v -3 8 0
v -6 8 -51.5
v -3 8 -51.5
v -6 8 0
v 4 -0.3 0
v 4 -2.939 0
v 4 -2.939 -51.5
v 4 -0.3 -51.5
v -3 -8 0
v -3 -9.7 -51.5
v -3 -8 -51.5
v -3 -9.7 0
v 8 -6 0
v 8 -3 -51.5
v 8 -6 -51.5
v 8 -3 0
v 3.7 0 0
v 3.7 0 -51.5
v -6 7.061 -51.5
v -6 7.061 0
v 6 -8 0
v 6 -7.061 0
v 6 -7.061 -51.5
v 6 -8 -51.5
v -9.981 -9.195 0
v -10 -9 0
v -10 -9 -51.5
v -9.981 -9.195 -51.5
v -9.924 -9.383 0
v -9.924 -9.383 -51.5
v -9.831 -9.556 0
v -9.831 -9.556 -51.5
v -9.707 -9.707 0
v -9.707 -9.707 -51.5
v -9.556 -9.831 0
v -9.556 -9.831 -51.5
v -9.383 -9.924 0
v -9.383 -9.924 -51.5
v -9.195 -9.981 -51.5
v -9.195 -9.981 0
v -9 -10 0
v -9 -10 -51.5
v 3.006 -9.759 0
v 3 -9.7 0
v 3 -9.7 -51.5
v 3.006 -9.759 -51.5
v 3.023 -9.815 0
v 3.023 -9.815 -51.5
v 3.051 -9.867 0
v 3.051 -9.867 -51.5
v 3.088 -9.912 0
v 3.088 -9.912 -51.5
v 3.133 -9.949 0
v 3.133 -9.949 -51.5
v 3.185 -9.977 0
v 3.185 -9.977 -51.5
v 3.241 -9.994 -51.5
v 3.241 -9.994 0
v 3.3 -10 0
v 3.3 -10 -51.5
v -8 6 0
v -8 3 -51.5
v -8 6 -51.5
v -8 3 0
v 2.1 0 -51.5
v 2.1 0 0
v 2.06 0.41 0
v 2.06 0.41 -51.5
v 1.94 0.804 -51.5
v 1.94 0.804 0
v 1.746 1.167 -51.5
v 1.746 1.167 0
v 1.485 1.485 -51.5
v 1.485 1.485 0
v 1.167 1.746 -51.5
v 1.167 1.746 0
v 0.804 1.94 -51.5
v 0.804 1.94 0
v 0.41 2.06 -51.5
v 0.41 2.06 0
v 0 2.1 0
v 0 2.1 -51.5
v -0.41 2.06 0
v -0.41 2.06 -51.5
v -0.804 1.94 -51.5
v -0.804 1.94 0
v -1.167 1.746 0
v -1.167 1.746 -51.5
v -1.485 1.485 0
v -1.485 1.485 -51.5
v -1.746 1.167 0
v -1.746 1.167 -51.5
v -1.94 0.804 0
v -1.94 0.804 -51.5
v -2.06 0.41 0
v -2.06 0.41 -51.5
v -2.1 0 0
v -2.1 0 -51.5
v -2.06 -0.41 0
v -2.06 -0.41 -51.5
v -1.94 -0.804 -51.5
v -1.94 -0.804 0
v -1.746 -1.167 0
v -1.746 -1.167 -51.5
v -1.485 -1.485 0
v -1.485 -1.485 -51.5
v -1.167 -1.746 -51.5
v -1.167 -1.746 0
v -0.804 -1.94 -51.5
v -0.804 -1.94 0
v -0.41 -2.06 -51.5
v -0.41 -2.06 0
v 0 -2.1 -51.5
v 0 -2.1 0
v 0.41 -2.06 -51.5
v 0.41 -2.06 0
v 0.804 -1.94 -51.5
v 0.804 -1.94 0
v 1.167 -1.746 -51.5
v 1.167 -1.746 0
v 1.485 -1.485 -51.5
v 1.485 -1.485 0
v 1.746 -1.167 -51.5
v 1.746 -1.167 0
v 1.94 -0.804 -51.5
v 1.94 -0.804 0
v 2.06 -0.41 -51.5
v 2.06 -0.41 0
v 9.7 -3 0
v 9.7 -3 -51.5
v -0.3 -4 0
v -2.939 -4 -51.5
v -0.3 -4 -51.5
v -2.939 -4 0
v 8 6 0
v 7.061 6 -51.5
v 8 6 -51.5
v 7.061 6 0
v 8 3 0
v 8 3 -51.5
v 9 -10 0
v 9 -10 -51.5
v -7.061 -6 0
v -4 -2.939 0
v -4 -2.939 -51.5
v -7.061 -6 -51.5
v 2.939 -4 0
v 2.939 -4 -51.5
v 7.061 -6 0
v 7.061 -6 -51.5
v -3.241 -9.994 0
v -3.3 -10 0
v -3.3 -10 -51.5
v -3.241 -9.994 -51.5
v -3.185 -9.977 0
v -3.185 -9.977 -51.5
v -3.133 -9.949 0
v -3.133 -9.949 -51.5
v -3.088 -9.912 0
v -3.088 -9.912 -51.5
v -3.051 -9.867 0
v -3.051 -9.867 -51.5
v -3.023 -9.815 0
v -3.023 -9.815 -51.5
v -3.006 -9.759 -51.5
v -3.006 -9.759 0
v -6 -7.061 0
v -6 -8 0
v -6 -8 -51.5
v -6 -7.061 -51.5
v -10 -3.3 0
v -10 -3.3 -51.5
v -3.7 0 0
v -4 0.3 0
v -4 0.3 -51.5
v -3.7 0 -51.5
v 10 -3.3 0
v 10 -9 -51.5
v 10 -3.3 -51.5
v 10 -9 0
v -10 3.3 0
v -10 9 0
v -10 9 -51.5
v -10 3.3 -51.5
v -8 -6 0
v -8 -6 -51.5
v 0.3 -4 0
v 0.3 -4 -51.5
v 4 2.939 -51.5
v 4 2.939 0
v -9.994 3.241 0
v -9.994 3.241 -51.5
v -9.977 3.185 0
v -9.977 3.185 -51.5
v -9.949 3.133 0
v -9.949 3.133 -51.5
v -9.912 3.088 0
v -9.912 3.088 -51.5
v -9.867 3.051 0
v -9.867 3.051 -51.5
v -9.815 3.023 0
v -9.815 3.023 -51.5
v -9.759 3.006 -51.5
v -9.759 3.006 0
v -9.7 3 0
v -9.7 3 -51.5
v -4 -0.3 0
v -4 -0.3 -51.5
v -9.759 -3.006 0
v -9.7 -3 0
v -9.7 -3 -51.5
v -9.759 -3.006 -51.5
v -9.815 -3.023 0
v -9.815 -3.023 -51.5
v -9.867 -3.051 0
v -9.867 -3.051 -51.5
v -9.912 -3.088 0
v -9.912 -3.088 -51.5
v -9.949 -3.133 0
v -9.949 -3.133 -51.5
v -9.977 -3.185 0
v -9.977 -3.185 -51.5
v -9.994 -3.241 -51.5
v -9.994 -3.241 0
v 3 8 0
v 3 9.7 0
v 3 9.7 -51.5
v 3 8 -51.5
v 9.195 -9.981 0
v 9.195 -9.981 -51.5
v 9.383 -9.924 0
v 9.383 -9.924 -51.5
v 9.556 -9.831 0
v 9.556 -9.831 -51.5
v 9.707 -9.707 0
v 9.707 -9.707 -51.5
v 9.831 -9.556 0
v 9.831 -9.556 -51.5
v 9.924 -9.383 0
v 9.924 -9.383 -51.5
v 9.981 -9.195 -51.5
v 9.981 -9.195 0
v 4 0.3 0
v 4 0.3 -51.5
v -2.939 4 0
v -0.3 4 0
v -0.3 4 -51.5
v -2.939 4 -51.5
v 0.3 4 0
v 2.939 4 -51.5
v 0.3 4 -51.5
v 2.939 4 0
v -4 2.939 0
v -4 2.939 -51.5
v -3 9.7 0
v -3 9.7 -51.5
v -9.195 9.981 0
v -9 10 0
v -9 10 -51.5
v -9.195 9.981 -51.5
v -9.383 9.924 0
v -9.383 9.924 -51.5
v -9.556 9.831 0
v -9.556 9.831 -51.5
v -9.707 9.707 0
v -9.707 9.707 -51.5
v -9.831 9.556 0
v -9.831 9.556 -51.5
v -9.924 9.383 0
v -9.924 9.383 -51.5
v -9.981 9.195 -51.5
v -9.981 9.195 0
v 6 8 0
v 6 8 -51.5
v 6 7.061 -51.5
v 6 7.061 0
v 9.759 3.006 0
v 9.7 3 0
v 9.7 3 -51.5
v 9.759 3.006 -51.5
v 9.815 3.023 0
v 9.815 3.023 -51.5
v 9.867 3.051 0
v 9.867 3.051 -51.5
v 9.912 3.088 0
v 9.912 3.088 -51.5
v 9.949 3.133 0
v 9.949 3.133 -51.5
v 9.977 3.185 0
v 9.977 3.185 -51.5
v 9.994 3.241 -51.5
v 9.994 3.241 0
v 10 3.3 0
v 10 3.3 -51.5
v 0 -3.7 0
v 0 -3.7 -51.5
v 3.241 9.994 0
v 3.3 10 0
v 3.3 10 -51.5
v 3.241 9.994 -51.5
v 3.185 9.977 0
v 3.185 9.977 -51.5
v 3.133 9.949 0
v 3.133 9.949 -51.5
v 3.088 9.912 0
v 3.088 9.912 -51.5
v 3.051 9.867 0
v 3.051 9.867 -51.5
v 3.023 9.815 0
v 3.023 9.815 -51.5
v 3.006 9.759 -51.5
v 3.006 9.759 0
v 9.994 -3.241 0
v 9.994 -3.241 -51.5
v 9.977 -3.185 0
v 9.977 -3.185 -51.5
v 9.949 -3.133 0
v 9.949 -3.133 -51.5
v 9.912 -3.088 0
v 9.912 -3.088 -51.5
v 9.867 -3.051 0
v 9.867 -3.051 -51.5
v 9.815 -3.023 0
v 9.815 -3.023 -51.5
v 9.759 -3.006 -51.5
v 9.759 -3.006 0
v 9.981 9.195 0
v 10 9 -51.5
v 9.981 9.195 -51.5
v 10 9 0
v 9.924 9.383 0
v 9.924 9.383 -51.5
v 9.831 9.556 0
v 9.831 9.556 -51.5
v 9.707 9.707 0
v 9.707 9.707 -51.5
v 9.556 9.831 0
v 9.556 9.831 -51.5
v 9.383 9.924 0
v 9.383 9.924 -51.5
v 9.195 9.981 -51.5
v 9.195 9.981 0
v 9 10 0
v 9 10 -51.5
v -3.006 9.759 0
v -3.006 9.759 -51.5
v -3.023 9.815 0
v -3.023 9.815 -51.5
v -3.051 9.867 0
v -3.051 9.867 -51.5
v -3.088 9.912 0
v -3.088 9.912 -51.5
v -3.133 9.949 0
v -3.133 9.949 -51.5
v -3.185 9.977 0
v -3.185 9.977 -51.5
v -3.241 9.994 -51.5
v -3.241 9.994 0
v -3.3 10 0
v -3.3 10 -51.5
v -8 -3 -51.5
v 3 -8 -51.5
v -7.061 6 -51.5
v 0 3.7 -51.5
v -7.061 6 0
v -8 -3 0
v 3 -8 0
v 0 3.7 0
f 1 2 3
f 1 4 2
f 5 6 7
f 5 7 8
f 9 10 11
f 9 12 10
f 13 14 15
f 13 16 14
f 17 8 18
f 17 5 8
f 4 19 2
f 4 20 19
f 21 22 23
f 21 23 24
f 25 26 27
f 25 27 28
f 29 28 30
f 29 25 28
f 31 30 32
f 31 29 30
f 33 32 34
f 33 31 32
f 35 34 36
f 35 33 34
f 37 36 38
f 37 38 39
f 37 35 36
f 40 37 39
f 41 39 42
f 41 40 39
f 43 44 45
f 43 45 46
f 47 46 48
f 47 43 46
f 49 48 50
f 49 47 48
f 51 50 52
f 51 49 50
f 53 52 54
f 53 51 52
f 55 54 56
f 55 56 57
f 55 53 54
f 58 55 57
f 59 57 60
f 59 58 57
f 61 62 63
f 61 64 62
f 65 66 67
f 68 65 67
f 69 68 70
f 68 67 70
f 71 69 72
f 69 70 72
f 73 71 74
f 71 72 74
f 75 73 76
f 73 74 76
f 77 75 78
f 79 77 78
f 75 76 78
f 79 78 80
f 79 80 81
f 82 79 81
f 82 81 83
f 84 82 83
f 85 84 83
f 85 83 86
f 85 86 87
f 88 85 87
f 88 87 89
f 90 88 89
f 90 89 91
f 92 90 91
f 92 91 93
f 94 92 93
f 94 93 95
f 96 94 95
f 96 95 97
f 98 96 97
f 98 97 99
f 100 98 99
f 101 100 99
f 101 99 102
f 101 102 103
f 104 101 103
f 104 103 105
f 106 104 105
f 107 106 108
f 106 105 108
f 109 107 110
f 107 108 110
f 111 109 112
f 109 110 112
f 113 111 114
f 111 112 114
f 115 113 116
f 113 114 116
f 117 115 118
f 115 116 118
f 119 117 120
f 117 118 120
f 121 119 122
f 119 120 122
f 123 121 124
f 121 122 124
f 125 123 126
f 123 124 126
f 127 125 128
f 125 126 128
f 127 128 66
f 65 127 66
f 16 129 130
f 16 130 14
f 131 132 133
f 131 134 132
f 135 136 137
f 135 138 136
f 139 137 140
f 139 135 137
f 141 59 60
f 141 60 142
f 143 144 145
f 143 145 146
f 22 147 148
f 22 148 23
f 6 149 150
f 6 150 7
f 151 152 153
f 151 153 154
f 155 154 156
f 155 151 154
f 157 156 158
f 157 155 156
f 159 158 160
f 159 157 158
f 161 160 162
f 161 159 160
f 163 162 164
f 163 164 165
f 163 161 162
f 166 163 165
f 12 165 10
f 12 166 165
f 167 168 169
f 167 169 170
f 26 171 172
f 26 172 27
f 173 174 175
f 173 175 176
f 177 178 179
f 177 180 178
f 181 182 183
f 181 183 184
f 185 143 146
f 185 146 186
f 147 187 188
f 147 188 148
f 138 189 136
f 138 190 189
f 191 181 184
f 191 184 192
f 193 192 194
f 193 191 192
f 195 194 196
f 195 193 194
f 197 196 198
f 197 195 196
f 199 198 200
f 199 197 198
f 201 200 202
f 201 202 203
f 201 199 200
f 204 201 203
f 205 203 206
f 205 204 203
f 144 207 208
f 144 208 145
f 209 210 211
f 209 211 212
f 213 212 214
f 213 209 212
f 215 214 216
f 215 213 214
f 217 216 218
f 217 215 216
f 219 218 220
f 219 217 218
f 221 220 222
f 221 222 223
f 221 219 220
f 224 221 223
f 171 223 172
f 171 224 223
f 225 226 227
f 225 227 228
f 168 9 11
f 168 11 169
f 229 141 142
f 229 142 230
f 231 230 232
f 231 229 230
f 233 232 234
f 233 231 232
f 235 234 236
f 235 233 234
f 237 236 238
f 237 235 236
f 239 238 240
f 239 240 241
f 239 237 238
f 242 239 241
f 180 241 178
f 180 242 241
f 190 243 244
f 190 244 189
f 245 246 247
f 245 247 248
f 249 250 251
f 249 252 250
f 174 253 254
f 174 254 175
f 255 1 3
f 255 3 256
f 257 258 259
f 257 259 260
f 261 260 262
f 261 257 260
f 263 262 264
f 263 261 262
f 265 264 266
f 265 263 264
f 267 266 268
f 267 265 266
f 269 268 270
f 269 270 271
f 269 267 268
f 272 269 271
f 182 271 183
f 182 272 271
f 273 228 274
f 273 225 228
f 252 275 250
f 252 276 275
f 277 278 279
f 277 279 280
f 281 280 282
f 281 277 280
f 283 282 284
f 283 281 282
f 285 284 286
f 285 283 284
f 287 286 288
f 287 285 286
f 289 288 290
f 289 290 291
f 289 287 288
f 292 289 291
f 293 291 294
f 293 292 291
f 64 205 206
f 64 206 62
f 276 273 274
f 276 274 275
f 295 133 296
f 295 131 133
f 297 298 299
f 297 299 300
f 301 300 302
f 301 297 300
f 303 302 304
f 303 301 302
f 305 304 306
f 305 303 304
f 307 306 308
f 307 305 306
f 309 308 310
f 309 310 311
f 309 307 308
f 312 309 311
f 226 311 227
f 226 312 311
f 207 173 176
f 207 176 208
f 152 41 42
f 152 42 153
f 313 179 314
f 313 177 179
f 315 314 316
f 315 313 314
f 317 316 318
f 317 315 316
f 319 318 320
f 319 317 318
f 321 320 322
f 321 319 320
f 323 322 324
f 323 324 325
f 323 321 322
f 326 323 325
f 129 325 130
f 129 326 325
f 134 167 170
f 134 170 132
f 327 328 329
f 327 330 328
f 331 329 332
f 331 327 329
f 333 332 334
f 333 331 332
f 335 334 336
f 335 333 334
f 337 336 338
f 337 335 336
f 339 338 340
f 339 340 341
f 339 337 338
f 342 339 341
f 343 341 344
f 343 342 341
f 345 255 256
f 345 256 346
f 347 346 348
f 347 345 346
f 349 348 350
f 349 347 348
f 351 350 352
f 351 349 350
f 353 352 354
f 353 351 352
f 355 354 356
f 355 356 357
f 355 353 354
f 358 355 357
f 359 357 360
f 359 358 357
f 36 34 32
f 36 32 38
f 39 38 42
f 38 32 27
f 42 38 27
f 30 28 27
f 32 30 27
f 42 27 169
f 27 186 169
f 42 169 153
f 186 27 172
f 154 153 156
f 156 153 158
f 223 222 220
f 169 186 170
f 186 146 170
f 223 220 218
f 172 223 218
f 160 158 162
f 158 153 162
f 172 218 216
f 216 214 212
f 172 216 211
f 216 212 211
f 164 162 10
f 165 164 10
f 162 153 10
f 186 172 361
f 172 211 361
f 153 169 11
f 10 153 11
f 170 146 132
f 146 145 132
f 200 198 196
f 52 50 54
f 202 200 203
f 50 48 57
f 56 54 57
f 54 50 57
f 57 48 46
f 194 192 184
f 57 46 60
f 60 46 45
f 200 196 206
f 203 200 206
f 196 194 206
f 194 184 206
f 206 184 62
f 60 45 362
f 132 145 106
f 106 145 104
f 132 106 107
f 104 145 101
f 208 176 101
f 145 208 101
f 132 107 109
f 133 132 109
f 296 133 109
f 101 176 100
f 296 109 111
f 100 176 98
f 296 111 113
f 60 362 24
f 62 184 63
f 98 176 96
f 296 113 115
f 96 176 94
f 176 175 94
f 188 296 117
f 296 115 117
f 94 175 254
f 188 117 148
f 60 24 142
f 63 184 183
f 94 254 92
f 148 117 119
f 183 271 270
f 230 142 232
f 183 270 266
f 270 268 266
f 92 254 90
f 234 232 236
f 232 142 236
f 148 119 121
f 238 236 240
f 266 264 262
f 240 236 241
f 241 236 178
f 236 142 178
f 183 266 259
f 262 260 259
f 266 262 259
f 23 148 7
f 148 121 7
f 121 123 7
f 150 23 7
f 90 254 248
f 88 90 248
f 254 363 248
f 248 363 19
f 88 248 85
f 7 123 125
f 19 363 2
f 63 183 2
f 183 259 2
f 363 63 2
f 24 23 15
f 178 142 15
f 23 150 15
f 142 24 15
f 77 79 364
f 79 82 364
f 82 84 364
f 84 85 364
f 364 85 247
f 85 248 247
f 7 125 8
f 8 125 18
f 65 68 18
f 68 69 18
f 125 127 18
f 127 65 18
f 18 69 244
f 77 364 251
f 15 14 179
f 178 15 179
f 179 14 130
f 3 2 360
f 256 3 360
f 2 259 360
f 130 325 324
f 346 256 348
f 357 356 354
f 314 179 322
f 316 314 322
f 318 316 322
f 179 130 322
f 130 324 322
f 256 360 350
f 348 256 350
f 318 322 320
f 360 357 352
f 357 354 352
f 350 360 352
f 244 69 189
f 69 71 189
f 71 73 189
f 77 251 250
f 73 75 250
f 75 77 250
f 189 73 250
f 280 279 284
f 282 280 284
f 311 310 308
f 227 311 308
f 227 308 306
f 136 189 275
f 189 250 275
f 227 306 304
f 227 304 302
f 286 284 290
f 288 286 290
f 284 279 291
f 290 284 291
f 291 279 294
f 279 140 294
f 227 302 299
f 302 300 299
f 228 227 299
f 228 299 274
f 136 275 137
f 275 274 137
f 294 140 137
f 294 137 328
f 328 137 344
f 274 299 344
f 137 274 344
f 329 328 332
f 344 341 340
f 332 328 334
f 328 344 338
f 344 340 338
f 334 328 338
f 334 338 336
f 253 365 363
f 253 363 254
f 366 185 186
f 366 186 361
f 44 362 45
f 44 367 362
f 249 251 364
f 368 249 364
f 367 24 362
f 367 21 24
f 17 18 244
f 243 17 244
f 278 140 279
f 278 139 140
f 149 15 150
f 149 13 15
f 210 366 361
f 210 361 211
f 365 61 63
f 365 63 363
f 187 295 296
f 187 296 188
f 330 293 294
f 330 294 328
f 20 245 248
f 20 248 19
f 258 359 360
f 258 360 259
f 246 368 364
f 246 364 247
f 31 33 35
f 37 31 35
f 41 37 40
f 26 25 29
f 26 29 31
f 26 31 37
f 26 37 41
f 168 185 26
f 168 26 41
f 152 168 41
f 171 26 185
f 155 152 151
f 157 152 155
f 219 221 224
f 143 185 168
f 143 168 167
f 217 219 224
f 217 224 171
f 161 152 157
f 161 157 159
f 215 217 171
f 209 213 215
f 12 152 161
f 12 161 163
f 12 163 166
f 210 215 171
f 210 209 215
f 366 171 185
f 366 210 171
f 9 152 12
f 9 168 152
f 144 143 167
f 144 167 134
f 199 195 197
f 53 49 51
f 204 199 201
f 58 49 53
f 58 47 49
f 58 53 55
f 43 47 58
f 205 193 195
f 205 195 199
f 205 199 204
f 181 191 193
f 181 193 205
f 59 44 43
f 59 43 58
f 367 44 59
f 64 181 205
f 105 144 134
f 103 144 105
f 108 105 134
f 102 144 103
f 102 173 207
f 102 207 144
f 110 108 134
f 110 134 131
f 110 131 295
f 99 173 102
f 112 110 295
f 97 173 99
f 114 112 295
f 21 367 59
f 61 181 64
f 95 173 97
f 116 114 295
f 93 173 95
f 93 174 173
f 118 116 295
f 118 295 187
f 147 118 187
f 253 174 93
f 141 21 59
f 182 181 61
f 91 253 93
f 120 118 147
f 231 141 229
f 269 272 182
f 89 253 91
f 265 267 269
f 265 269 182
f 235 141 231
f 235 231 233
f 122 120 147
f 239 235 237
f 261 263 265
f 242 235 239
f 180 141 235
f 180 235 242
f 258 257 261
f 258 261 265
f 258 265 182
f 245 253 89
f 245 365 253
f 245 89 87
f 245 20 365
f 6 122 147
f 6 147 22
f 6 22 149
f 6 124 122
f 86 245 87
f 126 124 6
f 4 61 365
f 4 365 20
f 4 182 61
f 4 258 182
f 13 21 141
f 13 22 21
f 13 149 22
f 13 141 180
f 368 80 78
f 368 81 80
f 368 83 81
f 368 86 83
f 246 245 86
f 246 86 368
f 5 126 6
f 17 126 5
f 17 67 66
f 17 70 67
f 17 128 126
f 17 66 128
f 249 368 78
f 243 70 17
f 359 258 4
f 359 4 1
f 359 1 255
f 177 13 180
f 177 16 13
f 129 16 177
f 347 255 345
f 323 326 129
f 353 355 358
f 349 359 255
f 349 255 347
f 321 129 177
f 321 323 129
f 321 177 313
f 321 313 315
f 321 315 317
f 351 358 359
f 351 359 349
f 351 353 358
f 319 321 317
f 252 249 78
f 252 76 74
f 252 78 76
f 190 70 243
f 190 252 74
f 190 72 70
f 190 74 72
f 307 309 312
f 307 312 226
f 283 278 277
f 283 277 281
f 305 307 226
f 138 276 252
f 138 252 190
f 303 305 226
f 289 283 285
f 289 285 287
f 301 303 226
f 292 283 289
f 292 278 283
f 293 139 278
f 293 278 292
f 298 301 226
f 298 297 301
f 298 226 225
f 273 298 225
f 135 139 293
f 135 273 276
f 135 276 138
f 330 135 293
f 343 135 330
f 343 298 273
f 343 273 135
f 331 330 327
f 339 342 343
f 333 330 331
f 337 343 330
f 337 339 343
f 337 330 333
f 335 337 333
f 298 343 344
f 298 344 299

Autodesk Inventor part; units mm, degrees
ref_plane "YZ Plane" through (0, 0, 0) normal (1, 0, 0) x (0, 1, 0)
ref_plane "XZ Plane" through (0, 0, 0) normal (0, 1, 0) x (-1, 0, 0)
ref_plane "XY Plane" through (0, 0, 0) normal (0, 0, 1) x (1, 0, 0)
sketch "Sketch_5" plane through (0, 0, 0) normal (0, 0, 1) x (1, 0, 0)
  line L0 (-10, 9) -> (-10, 3.3)
  arc A0 (-10, 3.3) -> (-9.7, 3) centre (-9.7, 3.3) ccw
  line L1 (-9.7, 3) -> (-8, 3)
  line L2 (-8, 3) -> (-8, 6)
  line L3 (-8, 6) -> (-7.0607, 6)
  line L4 (-7.0607, 6) -> (-4, 2.9393)
  line L5 (-4, 2.9393) -> (-4, 0.3)
  line L6 (-4, 0.3) -> (-3.7, 0)
  line L7 (-3.7, 0) -> (-4, -0.3)
  line L8 (-4, -0.3) -> (-4, -2.9393)
  line L9 (-4, -2.9393) -> (-7.0607, -6)
  line L10 (-7.0607, -6) -> (-8, -6)
  line L11 (-8, -6) -> (-8, -3)
  line L12 (-8, -3) -> (-9.7, -3)
  arc A1 (-9.7, -3) -> (-10, -3.3) centre (-9.7, -3.3) ccw
  line L13 (-10, -3.3) -> (-10, -9)
  arc A2 (-10, -9) -> (-9, -10) centre (-9, -9) ccw
  line L14 (-9, -10) -> (-3.3, -10)
  arc A3 (-3.3, -10) -> (-3, -9.7) centre (-3.3, -9.7) ccw
  line L15 (-3, -9.7) -> (-3, -8)
  line L16 (-3, -8) -> (-6, -8)
  line L17 (-6, -8) -> (-6, -7.0607)
  line L18 (-6, -7.0607) -> (-2.9393, -4)
  line L19 (-2.9393, -4) -> (-0.3, -4)
  line L20 (-0.3, -4) -> (0, -3.7)
  line L21 (0, -3.7) -> (0.3, -4)
  line L22 (0.3, -4) -> (2.9393, -4)
  line L23 (2.9393, -4) -> (6, -7.0607)
  line L24 (6, -7.0607) -> (6, -8)
  line L25 (6, -8) -> (3, -8)
  line L26 (3, -8) -> (3, -9.7)
  arc A4 (3, -9.7) -> (3.3, -10) centre (3.3, -9.7) ccw
  line L27 (3.3, -10) -> (9, -10)
  arc A5 (9, -10) -> (10, -9) centre (9, -9) ccw
  line L28 (10, -9) -> (10, -3.3)
  arc A6 (10, -3.3) -> (9.7, -3) centre (9.7, -3.3) ccw
  line L29 (9.7, -3) -> (8, -3)
  line L30 (8, -3) -> (8, -6)
  line L31 (8, -6) -> (7.0607, -6)
  line L32 (7.0607, -6) -> (4, -2.9393)
  line L33 (4, -2.9393) -> (4, -0.3)
  line L34 (4, -0.3) -> (3.7, 0)
  line L35 (3.7, 0) -> (4, 0.3)
  line L36 (4, 0.3) -> (4, 2.9393)
  line L37 (4, 2.9393) -> (7.0607, 6)
  line L38 (7.0607, 6) -> (8, 6)
  line L39 (8, 6) -> (8, 3)
  line L40 (8, 3) -> (9.7, 3)
  arc A7 (9.7, 3) -> (10, 3.3) centre (9.7, 3.3) ccw
  line L41 (10, 3.3) -> (10, 9)
  arc A8 (10, 9) -> (9, 10) centre (9, 9) ccw
  line L42 (9, 10) -> (3.3, 10)
  arc A9 (3.3, 10) -> (3, 9.7) centre (3.3, 9.7) ccw
  line L43 (3, 9.7) -> (3, 8)
  line L44 (3, 8) -> (6, 8)
  line L45 (6, 8) -> (6, 7.0607)
  line L46 (6, 7.0607) -> (2.9393, 4)
  line L47 (2.9393, 4) -> (0.3, 4)
  line L48 (0.3, 4) -> (0, 3.7)
  line L49 (0, 3.7) -> (-0.3, 4)
  line L50 (-0.3, 4) -> (-2.9393, 4)
  line L51 (-2.9393, 4) -> (-6, 7.0607)
  line L52 (-6, 7.0607) -> (-6, 8)
  line L53 (-6, 8) -> (-3, 8)
  line L54 (-3, 8) -> (-3, 9.7)
  arc A10 (-3, 9.7) -> (-3.3, 10) centre (-3.3, 9.7) ccw
  line L55 (-3.3, 10) -> (-9, 10)
  arc A11 (-9, 10) -> (-10, 9) centre (-9, 9) ccw
  circle A12 centre (0, 0) radius 2.1
extrude "Extrusion1" add sketch "Sketch_5" against normal blind 51.5
properties part number "KHFS5-2020-4000"
